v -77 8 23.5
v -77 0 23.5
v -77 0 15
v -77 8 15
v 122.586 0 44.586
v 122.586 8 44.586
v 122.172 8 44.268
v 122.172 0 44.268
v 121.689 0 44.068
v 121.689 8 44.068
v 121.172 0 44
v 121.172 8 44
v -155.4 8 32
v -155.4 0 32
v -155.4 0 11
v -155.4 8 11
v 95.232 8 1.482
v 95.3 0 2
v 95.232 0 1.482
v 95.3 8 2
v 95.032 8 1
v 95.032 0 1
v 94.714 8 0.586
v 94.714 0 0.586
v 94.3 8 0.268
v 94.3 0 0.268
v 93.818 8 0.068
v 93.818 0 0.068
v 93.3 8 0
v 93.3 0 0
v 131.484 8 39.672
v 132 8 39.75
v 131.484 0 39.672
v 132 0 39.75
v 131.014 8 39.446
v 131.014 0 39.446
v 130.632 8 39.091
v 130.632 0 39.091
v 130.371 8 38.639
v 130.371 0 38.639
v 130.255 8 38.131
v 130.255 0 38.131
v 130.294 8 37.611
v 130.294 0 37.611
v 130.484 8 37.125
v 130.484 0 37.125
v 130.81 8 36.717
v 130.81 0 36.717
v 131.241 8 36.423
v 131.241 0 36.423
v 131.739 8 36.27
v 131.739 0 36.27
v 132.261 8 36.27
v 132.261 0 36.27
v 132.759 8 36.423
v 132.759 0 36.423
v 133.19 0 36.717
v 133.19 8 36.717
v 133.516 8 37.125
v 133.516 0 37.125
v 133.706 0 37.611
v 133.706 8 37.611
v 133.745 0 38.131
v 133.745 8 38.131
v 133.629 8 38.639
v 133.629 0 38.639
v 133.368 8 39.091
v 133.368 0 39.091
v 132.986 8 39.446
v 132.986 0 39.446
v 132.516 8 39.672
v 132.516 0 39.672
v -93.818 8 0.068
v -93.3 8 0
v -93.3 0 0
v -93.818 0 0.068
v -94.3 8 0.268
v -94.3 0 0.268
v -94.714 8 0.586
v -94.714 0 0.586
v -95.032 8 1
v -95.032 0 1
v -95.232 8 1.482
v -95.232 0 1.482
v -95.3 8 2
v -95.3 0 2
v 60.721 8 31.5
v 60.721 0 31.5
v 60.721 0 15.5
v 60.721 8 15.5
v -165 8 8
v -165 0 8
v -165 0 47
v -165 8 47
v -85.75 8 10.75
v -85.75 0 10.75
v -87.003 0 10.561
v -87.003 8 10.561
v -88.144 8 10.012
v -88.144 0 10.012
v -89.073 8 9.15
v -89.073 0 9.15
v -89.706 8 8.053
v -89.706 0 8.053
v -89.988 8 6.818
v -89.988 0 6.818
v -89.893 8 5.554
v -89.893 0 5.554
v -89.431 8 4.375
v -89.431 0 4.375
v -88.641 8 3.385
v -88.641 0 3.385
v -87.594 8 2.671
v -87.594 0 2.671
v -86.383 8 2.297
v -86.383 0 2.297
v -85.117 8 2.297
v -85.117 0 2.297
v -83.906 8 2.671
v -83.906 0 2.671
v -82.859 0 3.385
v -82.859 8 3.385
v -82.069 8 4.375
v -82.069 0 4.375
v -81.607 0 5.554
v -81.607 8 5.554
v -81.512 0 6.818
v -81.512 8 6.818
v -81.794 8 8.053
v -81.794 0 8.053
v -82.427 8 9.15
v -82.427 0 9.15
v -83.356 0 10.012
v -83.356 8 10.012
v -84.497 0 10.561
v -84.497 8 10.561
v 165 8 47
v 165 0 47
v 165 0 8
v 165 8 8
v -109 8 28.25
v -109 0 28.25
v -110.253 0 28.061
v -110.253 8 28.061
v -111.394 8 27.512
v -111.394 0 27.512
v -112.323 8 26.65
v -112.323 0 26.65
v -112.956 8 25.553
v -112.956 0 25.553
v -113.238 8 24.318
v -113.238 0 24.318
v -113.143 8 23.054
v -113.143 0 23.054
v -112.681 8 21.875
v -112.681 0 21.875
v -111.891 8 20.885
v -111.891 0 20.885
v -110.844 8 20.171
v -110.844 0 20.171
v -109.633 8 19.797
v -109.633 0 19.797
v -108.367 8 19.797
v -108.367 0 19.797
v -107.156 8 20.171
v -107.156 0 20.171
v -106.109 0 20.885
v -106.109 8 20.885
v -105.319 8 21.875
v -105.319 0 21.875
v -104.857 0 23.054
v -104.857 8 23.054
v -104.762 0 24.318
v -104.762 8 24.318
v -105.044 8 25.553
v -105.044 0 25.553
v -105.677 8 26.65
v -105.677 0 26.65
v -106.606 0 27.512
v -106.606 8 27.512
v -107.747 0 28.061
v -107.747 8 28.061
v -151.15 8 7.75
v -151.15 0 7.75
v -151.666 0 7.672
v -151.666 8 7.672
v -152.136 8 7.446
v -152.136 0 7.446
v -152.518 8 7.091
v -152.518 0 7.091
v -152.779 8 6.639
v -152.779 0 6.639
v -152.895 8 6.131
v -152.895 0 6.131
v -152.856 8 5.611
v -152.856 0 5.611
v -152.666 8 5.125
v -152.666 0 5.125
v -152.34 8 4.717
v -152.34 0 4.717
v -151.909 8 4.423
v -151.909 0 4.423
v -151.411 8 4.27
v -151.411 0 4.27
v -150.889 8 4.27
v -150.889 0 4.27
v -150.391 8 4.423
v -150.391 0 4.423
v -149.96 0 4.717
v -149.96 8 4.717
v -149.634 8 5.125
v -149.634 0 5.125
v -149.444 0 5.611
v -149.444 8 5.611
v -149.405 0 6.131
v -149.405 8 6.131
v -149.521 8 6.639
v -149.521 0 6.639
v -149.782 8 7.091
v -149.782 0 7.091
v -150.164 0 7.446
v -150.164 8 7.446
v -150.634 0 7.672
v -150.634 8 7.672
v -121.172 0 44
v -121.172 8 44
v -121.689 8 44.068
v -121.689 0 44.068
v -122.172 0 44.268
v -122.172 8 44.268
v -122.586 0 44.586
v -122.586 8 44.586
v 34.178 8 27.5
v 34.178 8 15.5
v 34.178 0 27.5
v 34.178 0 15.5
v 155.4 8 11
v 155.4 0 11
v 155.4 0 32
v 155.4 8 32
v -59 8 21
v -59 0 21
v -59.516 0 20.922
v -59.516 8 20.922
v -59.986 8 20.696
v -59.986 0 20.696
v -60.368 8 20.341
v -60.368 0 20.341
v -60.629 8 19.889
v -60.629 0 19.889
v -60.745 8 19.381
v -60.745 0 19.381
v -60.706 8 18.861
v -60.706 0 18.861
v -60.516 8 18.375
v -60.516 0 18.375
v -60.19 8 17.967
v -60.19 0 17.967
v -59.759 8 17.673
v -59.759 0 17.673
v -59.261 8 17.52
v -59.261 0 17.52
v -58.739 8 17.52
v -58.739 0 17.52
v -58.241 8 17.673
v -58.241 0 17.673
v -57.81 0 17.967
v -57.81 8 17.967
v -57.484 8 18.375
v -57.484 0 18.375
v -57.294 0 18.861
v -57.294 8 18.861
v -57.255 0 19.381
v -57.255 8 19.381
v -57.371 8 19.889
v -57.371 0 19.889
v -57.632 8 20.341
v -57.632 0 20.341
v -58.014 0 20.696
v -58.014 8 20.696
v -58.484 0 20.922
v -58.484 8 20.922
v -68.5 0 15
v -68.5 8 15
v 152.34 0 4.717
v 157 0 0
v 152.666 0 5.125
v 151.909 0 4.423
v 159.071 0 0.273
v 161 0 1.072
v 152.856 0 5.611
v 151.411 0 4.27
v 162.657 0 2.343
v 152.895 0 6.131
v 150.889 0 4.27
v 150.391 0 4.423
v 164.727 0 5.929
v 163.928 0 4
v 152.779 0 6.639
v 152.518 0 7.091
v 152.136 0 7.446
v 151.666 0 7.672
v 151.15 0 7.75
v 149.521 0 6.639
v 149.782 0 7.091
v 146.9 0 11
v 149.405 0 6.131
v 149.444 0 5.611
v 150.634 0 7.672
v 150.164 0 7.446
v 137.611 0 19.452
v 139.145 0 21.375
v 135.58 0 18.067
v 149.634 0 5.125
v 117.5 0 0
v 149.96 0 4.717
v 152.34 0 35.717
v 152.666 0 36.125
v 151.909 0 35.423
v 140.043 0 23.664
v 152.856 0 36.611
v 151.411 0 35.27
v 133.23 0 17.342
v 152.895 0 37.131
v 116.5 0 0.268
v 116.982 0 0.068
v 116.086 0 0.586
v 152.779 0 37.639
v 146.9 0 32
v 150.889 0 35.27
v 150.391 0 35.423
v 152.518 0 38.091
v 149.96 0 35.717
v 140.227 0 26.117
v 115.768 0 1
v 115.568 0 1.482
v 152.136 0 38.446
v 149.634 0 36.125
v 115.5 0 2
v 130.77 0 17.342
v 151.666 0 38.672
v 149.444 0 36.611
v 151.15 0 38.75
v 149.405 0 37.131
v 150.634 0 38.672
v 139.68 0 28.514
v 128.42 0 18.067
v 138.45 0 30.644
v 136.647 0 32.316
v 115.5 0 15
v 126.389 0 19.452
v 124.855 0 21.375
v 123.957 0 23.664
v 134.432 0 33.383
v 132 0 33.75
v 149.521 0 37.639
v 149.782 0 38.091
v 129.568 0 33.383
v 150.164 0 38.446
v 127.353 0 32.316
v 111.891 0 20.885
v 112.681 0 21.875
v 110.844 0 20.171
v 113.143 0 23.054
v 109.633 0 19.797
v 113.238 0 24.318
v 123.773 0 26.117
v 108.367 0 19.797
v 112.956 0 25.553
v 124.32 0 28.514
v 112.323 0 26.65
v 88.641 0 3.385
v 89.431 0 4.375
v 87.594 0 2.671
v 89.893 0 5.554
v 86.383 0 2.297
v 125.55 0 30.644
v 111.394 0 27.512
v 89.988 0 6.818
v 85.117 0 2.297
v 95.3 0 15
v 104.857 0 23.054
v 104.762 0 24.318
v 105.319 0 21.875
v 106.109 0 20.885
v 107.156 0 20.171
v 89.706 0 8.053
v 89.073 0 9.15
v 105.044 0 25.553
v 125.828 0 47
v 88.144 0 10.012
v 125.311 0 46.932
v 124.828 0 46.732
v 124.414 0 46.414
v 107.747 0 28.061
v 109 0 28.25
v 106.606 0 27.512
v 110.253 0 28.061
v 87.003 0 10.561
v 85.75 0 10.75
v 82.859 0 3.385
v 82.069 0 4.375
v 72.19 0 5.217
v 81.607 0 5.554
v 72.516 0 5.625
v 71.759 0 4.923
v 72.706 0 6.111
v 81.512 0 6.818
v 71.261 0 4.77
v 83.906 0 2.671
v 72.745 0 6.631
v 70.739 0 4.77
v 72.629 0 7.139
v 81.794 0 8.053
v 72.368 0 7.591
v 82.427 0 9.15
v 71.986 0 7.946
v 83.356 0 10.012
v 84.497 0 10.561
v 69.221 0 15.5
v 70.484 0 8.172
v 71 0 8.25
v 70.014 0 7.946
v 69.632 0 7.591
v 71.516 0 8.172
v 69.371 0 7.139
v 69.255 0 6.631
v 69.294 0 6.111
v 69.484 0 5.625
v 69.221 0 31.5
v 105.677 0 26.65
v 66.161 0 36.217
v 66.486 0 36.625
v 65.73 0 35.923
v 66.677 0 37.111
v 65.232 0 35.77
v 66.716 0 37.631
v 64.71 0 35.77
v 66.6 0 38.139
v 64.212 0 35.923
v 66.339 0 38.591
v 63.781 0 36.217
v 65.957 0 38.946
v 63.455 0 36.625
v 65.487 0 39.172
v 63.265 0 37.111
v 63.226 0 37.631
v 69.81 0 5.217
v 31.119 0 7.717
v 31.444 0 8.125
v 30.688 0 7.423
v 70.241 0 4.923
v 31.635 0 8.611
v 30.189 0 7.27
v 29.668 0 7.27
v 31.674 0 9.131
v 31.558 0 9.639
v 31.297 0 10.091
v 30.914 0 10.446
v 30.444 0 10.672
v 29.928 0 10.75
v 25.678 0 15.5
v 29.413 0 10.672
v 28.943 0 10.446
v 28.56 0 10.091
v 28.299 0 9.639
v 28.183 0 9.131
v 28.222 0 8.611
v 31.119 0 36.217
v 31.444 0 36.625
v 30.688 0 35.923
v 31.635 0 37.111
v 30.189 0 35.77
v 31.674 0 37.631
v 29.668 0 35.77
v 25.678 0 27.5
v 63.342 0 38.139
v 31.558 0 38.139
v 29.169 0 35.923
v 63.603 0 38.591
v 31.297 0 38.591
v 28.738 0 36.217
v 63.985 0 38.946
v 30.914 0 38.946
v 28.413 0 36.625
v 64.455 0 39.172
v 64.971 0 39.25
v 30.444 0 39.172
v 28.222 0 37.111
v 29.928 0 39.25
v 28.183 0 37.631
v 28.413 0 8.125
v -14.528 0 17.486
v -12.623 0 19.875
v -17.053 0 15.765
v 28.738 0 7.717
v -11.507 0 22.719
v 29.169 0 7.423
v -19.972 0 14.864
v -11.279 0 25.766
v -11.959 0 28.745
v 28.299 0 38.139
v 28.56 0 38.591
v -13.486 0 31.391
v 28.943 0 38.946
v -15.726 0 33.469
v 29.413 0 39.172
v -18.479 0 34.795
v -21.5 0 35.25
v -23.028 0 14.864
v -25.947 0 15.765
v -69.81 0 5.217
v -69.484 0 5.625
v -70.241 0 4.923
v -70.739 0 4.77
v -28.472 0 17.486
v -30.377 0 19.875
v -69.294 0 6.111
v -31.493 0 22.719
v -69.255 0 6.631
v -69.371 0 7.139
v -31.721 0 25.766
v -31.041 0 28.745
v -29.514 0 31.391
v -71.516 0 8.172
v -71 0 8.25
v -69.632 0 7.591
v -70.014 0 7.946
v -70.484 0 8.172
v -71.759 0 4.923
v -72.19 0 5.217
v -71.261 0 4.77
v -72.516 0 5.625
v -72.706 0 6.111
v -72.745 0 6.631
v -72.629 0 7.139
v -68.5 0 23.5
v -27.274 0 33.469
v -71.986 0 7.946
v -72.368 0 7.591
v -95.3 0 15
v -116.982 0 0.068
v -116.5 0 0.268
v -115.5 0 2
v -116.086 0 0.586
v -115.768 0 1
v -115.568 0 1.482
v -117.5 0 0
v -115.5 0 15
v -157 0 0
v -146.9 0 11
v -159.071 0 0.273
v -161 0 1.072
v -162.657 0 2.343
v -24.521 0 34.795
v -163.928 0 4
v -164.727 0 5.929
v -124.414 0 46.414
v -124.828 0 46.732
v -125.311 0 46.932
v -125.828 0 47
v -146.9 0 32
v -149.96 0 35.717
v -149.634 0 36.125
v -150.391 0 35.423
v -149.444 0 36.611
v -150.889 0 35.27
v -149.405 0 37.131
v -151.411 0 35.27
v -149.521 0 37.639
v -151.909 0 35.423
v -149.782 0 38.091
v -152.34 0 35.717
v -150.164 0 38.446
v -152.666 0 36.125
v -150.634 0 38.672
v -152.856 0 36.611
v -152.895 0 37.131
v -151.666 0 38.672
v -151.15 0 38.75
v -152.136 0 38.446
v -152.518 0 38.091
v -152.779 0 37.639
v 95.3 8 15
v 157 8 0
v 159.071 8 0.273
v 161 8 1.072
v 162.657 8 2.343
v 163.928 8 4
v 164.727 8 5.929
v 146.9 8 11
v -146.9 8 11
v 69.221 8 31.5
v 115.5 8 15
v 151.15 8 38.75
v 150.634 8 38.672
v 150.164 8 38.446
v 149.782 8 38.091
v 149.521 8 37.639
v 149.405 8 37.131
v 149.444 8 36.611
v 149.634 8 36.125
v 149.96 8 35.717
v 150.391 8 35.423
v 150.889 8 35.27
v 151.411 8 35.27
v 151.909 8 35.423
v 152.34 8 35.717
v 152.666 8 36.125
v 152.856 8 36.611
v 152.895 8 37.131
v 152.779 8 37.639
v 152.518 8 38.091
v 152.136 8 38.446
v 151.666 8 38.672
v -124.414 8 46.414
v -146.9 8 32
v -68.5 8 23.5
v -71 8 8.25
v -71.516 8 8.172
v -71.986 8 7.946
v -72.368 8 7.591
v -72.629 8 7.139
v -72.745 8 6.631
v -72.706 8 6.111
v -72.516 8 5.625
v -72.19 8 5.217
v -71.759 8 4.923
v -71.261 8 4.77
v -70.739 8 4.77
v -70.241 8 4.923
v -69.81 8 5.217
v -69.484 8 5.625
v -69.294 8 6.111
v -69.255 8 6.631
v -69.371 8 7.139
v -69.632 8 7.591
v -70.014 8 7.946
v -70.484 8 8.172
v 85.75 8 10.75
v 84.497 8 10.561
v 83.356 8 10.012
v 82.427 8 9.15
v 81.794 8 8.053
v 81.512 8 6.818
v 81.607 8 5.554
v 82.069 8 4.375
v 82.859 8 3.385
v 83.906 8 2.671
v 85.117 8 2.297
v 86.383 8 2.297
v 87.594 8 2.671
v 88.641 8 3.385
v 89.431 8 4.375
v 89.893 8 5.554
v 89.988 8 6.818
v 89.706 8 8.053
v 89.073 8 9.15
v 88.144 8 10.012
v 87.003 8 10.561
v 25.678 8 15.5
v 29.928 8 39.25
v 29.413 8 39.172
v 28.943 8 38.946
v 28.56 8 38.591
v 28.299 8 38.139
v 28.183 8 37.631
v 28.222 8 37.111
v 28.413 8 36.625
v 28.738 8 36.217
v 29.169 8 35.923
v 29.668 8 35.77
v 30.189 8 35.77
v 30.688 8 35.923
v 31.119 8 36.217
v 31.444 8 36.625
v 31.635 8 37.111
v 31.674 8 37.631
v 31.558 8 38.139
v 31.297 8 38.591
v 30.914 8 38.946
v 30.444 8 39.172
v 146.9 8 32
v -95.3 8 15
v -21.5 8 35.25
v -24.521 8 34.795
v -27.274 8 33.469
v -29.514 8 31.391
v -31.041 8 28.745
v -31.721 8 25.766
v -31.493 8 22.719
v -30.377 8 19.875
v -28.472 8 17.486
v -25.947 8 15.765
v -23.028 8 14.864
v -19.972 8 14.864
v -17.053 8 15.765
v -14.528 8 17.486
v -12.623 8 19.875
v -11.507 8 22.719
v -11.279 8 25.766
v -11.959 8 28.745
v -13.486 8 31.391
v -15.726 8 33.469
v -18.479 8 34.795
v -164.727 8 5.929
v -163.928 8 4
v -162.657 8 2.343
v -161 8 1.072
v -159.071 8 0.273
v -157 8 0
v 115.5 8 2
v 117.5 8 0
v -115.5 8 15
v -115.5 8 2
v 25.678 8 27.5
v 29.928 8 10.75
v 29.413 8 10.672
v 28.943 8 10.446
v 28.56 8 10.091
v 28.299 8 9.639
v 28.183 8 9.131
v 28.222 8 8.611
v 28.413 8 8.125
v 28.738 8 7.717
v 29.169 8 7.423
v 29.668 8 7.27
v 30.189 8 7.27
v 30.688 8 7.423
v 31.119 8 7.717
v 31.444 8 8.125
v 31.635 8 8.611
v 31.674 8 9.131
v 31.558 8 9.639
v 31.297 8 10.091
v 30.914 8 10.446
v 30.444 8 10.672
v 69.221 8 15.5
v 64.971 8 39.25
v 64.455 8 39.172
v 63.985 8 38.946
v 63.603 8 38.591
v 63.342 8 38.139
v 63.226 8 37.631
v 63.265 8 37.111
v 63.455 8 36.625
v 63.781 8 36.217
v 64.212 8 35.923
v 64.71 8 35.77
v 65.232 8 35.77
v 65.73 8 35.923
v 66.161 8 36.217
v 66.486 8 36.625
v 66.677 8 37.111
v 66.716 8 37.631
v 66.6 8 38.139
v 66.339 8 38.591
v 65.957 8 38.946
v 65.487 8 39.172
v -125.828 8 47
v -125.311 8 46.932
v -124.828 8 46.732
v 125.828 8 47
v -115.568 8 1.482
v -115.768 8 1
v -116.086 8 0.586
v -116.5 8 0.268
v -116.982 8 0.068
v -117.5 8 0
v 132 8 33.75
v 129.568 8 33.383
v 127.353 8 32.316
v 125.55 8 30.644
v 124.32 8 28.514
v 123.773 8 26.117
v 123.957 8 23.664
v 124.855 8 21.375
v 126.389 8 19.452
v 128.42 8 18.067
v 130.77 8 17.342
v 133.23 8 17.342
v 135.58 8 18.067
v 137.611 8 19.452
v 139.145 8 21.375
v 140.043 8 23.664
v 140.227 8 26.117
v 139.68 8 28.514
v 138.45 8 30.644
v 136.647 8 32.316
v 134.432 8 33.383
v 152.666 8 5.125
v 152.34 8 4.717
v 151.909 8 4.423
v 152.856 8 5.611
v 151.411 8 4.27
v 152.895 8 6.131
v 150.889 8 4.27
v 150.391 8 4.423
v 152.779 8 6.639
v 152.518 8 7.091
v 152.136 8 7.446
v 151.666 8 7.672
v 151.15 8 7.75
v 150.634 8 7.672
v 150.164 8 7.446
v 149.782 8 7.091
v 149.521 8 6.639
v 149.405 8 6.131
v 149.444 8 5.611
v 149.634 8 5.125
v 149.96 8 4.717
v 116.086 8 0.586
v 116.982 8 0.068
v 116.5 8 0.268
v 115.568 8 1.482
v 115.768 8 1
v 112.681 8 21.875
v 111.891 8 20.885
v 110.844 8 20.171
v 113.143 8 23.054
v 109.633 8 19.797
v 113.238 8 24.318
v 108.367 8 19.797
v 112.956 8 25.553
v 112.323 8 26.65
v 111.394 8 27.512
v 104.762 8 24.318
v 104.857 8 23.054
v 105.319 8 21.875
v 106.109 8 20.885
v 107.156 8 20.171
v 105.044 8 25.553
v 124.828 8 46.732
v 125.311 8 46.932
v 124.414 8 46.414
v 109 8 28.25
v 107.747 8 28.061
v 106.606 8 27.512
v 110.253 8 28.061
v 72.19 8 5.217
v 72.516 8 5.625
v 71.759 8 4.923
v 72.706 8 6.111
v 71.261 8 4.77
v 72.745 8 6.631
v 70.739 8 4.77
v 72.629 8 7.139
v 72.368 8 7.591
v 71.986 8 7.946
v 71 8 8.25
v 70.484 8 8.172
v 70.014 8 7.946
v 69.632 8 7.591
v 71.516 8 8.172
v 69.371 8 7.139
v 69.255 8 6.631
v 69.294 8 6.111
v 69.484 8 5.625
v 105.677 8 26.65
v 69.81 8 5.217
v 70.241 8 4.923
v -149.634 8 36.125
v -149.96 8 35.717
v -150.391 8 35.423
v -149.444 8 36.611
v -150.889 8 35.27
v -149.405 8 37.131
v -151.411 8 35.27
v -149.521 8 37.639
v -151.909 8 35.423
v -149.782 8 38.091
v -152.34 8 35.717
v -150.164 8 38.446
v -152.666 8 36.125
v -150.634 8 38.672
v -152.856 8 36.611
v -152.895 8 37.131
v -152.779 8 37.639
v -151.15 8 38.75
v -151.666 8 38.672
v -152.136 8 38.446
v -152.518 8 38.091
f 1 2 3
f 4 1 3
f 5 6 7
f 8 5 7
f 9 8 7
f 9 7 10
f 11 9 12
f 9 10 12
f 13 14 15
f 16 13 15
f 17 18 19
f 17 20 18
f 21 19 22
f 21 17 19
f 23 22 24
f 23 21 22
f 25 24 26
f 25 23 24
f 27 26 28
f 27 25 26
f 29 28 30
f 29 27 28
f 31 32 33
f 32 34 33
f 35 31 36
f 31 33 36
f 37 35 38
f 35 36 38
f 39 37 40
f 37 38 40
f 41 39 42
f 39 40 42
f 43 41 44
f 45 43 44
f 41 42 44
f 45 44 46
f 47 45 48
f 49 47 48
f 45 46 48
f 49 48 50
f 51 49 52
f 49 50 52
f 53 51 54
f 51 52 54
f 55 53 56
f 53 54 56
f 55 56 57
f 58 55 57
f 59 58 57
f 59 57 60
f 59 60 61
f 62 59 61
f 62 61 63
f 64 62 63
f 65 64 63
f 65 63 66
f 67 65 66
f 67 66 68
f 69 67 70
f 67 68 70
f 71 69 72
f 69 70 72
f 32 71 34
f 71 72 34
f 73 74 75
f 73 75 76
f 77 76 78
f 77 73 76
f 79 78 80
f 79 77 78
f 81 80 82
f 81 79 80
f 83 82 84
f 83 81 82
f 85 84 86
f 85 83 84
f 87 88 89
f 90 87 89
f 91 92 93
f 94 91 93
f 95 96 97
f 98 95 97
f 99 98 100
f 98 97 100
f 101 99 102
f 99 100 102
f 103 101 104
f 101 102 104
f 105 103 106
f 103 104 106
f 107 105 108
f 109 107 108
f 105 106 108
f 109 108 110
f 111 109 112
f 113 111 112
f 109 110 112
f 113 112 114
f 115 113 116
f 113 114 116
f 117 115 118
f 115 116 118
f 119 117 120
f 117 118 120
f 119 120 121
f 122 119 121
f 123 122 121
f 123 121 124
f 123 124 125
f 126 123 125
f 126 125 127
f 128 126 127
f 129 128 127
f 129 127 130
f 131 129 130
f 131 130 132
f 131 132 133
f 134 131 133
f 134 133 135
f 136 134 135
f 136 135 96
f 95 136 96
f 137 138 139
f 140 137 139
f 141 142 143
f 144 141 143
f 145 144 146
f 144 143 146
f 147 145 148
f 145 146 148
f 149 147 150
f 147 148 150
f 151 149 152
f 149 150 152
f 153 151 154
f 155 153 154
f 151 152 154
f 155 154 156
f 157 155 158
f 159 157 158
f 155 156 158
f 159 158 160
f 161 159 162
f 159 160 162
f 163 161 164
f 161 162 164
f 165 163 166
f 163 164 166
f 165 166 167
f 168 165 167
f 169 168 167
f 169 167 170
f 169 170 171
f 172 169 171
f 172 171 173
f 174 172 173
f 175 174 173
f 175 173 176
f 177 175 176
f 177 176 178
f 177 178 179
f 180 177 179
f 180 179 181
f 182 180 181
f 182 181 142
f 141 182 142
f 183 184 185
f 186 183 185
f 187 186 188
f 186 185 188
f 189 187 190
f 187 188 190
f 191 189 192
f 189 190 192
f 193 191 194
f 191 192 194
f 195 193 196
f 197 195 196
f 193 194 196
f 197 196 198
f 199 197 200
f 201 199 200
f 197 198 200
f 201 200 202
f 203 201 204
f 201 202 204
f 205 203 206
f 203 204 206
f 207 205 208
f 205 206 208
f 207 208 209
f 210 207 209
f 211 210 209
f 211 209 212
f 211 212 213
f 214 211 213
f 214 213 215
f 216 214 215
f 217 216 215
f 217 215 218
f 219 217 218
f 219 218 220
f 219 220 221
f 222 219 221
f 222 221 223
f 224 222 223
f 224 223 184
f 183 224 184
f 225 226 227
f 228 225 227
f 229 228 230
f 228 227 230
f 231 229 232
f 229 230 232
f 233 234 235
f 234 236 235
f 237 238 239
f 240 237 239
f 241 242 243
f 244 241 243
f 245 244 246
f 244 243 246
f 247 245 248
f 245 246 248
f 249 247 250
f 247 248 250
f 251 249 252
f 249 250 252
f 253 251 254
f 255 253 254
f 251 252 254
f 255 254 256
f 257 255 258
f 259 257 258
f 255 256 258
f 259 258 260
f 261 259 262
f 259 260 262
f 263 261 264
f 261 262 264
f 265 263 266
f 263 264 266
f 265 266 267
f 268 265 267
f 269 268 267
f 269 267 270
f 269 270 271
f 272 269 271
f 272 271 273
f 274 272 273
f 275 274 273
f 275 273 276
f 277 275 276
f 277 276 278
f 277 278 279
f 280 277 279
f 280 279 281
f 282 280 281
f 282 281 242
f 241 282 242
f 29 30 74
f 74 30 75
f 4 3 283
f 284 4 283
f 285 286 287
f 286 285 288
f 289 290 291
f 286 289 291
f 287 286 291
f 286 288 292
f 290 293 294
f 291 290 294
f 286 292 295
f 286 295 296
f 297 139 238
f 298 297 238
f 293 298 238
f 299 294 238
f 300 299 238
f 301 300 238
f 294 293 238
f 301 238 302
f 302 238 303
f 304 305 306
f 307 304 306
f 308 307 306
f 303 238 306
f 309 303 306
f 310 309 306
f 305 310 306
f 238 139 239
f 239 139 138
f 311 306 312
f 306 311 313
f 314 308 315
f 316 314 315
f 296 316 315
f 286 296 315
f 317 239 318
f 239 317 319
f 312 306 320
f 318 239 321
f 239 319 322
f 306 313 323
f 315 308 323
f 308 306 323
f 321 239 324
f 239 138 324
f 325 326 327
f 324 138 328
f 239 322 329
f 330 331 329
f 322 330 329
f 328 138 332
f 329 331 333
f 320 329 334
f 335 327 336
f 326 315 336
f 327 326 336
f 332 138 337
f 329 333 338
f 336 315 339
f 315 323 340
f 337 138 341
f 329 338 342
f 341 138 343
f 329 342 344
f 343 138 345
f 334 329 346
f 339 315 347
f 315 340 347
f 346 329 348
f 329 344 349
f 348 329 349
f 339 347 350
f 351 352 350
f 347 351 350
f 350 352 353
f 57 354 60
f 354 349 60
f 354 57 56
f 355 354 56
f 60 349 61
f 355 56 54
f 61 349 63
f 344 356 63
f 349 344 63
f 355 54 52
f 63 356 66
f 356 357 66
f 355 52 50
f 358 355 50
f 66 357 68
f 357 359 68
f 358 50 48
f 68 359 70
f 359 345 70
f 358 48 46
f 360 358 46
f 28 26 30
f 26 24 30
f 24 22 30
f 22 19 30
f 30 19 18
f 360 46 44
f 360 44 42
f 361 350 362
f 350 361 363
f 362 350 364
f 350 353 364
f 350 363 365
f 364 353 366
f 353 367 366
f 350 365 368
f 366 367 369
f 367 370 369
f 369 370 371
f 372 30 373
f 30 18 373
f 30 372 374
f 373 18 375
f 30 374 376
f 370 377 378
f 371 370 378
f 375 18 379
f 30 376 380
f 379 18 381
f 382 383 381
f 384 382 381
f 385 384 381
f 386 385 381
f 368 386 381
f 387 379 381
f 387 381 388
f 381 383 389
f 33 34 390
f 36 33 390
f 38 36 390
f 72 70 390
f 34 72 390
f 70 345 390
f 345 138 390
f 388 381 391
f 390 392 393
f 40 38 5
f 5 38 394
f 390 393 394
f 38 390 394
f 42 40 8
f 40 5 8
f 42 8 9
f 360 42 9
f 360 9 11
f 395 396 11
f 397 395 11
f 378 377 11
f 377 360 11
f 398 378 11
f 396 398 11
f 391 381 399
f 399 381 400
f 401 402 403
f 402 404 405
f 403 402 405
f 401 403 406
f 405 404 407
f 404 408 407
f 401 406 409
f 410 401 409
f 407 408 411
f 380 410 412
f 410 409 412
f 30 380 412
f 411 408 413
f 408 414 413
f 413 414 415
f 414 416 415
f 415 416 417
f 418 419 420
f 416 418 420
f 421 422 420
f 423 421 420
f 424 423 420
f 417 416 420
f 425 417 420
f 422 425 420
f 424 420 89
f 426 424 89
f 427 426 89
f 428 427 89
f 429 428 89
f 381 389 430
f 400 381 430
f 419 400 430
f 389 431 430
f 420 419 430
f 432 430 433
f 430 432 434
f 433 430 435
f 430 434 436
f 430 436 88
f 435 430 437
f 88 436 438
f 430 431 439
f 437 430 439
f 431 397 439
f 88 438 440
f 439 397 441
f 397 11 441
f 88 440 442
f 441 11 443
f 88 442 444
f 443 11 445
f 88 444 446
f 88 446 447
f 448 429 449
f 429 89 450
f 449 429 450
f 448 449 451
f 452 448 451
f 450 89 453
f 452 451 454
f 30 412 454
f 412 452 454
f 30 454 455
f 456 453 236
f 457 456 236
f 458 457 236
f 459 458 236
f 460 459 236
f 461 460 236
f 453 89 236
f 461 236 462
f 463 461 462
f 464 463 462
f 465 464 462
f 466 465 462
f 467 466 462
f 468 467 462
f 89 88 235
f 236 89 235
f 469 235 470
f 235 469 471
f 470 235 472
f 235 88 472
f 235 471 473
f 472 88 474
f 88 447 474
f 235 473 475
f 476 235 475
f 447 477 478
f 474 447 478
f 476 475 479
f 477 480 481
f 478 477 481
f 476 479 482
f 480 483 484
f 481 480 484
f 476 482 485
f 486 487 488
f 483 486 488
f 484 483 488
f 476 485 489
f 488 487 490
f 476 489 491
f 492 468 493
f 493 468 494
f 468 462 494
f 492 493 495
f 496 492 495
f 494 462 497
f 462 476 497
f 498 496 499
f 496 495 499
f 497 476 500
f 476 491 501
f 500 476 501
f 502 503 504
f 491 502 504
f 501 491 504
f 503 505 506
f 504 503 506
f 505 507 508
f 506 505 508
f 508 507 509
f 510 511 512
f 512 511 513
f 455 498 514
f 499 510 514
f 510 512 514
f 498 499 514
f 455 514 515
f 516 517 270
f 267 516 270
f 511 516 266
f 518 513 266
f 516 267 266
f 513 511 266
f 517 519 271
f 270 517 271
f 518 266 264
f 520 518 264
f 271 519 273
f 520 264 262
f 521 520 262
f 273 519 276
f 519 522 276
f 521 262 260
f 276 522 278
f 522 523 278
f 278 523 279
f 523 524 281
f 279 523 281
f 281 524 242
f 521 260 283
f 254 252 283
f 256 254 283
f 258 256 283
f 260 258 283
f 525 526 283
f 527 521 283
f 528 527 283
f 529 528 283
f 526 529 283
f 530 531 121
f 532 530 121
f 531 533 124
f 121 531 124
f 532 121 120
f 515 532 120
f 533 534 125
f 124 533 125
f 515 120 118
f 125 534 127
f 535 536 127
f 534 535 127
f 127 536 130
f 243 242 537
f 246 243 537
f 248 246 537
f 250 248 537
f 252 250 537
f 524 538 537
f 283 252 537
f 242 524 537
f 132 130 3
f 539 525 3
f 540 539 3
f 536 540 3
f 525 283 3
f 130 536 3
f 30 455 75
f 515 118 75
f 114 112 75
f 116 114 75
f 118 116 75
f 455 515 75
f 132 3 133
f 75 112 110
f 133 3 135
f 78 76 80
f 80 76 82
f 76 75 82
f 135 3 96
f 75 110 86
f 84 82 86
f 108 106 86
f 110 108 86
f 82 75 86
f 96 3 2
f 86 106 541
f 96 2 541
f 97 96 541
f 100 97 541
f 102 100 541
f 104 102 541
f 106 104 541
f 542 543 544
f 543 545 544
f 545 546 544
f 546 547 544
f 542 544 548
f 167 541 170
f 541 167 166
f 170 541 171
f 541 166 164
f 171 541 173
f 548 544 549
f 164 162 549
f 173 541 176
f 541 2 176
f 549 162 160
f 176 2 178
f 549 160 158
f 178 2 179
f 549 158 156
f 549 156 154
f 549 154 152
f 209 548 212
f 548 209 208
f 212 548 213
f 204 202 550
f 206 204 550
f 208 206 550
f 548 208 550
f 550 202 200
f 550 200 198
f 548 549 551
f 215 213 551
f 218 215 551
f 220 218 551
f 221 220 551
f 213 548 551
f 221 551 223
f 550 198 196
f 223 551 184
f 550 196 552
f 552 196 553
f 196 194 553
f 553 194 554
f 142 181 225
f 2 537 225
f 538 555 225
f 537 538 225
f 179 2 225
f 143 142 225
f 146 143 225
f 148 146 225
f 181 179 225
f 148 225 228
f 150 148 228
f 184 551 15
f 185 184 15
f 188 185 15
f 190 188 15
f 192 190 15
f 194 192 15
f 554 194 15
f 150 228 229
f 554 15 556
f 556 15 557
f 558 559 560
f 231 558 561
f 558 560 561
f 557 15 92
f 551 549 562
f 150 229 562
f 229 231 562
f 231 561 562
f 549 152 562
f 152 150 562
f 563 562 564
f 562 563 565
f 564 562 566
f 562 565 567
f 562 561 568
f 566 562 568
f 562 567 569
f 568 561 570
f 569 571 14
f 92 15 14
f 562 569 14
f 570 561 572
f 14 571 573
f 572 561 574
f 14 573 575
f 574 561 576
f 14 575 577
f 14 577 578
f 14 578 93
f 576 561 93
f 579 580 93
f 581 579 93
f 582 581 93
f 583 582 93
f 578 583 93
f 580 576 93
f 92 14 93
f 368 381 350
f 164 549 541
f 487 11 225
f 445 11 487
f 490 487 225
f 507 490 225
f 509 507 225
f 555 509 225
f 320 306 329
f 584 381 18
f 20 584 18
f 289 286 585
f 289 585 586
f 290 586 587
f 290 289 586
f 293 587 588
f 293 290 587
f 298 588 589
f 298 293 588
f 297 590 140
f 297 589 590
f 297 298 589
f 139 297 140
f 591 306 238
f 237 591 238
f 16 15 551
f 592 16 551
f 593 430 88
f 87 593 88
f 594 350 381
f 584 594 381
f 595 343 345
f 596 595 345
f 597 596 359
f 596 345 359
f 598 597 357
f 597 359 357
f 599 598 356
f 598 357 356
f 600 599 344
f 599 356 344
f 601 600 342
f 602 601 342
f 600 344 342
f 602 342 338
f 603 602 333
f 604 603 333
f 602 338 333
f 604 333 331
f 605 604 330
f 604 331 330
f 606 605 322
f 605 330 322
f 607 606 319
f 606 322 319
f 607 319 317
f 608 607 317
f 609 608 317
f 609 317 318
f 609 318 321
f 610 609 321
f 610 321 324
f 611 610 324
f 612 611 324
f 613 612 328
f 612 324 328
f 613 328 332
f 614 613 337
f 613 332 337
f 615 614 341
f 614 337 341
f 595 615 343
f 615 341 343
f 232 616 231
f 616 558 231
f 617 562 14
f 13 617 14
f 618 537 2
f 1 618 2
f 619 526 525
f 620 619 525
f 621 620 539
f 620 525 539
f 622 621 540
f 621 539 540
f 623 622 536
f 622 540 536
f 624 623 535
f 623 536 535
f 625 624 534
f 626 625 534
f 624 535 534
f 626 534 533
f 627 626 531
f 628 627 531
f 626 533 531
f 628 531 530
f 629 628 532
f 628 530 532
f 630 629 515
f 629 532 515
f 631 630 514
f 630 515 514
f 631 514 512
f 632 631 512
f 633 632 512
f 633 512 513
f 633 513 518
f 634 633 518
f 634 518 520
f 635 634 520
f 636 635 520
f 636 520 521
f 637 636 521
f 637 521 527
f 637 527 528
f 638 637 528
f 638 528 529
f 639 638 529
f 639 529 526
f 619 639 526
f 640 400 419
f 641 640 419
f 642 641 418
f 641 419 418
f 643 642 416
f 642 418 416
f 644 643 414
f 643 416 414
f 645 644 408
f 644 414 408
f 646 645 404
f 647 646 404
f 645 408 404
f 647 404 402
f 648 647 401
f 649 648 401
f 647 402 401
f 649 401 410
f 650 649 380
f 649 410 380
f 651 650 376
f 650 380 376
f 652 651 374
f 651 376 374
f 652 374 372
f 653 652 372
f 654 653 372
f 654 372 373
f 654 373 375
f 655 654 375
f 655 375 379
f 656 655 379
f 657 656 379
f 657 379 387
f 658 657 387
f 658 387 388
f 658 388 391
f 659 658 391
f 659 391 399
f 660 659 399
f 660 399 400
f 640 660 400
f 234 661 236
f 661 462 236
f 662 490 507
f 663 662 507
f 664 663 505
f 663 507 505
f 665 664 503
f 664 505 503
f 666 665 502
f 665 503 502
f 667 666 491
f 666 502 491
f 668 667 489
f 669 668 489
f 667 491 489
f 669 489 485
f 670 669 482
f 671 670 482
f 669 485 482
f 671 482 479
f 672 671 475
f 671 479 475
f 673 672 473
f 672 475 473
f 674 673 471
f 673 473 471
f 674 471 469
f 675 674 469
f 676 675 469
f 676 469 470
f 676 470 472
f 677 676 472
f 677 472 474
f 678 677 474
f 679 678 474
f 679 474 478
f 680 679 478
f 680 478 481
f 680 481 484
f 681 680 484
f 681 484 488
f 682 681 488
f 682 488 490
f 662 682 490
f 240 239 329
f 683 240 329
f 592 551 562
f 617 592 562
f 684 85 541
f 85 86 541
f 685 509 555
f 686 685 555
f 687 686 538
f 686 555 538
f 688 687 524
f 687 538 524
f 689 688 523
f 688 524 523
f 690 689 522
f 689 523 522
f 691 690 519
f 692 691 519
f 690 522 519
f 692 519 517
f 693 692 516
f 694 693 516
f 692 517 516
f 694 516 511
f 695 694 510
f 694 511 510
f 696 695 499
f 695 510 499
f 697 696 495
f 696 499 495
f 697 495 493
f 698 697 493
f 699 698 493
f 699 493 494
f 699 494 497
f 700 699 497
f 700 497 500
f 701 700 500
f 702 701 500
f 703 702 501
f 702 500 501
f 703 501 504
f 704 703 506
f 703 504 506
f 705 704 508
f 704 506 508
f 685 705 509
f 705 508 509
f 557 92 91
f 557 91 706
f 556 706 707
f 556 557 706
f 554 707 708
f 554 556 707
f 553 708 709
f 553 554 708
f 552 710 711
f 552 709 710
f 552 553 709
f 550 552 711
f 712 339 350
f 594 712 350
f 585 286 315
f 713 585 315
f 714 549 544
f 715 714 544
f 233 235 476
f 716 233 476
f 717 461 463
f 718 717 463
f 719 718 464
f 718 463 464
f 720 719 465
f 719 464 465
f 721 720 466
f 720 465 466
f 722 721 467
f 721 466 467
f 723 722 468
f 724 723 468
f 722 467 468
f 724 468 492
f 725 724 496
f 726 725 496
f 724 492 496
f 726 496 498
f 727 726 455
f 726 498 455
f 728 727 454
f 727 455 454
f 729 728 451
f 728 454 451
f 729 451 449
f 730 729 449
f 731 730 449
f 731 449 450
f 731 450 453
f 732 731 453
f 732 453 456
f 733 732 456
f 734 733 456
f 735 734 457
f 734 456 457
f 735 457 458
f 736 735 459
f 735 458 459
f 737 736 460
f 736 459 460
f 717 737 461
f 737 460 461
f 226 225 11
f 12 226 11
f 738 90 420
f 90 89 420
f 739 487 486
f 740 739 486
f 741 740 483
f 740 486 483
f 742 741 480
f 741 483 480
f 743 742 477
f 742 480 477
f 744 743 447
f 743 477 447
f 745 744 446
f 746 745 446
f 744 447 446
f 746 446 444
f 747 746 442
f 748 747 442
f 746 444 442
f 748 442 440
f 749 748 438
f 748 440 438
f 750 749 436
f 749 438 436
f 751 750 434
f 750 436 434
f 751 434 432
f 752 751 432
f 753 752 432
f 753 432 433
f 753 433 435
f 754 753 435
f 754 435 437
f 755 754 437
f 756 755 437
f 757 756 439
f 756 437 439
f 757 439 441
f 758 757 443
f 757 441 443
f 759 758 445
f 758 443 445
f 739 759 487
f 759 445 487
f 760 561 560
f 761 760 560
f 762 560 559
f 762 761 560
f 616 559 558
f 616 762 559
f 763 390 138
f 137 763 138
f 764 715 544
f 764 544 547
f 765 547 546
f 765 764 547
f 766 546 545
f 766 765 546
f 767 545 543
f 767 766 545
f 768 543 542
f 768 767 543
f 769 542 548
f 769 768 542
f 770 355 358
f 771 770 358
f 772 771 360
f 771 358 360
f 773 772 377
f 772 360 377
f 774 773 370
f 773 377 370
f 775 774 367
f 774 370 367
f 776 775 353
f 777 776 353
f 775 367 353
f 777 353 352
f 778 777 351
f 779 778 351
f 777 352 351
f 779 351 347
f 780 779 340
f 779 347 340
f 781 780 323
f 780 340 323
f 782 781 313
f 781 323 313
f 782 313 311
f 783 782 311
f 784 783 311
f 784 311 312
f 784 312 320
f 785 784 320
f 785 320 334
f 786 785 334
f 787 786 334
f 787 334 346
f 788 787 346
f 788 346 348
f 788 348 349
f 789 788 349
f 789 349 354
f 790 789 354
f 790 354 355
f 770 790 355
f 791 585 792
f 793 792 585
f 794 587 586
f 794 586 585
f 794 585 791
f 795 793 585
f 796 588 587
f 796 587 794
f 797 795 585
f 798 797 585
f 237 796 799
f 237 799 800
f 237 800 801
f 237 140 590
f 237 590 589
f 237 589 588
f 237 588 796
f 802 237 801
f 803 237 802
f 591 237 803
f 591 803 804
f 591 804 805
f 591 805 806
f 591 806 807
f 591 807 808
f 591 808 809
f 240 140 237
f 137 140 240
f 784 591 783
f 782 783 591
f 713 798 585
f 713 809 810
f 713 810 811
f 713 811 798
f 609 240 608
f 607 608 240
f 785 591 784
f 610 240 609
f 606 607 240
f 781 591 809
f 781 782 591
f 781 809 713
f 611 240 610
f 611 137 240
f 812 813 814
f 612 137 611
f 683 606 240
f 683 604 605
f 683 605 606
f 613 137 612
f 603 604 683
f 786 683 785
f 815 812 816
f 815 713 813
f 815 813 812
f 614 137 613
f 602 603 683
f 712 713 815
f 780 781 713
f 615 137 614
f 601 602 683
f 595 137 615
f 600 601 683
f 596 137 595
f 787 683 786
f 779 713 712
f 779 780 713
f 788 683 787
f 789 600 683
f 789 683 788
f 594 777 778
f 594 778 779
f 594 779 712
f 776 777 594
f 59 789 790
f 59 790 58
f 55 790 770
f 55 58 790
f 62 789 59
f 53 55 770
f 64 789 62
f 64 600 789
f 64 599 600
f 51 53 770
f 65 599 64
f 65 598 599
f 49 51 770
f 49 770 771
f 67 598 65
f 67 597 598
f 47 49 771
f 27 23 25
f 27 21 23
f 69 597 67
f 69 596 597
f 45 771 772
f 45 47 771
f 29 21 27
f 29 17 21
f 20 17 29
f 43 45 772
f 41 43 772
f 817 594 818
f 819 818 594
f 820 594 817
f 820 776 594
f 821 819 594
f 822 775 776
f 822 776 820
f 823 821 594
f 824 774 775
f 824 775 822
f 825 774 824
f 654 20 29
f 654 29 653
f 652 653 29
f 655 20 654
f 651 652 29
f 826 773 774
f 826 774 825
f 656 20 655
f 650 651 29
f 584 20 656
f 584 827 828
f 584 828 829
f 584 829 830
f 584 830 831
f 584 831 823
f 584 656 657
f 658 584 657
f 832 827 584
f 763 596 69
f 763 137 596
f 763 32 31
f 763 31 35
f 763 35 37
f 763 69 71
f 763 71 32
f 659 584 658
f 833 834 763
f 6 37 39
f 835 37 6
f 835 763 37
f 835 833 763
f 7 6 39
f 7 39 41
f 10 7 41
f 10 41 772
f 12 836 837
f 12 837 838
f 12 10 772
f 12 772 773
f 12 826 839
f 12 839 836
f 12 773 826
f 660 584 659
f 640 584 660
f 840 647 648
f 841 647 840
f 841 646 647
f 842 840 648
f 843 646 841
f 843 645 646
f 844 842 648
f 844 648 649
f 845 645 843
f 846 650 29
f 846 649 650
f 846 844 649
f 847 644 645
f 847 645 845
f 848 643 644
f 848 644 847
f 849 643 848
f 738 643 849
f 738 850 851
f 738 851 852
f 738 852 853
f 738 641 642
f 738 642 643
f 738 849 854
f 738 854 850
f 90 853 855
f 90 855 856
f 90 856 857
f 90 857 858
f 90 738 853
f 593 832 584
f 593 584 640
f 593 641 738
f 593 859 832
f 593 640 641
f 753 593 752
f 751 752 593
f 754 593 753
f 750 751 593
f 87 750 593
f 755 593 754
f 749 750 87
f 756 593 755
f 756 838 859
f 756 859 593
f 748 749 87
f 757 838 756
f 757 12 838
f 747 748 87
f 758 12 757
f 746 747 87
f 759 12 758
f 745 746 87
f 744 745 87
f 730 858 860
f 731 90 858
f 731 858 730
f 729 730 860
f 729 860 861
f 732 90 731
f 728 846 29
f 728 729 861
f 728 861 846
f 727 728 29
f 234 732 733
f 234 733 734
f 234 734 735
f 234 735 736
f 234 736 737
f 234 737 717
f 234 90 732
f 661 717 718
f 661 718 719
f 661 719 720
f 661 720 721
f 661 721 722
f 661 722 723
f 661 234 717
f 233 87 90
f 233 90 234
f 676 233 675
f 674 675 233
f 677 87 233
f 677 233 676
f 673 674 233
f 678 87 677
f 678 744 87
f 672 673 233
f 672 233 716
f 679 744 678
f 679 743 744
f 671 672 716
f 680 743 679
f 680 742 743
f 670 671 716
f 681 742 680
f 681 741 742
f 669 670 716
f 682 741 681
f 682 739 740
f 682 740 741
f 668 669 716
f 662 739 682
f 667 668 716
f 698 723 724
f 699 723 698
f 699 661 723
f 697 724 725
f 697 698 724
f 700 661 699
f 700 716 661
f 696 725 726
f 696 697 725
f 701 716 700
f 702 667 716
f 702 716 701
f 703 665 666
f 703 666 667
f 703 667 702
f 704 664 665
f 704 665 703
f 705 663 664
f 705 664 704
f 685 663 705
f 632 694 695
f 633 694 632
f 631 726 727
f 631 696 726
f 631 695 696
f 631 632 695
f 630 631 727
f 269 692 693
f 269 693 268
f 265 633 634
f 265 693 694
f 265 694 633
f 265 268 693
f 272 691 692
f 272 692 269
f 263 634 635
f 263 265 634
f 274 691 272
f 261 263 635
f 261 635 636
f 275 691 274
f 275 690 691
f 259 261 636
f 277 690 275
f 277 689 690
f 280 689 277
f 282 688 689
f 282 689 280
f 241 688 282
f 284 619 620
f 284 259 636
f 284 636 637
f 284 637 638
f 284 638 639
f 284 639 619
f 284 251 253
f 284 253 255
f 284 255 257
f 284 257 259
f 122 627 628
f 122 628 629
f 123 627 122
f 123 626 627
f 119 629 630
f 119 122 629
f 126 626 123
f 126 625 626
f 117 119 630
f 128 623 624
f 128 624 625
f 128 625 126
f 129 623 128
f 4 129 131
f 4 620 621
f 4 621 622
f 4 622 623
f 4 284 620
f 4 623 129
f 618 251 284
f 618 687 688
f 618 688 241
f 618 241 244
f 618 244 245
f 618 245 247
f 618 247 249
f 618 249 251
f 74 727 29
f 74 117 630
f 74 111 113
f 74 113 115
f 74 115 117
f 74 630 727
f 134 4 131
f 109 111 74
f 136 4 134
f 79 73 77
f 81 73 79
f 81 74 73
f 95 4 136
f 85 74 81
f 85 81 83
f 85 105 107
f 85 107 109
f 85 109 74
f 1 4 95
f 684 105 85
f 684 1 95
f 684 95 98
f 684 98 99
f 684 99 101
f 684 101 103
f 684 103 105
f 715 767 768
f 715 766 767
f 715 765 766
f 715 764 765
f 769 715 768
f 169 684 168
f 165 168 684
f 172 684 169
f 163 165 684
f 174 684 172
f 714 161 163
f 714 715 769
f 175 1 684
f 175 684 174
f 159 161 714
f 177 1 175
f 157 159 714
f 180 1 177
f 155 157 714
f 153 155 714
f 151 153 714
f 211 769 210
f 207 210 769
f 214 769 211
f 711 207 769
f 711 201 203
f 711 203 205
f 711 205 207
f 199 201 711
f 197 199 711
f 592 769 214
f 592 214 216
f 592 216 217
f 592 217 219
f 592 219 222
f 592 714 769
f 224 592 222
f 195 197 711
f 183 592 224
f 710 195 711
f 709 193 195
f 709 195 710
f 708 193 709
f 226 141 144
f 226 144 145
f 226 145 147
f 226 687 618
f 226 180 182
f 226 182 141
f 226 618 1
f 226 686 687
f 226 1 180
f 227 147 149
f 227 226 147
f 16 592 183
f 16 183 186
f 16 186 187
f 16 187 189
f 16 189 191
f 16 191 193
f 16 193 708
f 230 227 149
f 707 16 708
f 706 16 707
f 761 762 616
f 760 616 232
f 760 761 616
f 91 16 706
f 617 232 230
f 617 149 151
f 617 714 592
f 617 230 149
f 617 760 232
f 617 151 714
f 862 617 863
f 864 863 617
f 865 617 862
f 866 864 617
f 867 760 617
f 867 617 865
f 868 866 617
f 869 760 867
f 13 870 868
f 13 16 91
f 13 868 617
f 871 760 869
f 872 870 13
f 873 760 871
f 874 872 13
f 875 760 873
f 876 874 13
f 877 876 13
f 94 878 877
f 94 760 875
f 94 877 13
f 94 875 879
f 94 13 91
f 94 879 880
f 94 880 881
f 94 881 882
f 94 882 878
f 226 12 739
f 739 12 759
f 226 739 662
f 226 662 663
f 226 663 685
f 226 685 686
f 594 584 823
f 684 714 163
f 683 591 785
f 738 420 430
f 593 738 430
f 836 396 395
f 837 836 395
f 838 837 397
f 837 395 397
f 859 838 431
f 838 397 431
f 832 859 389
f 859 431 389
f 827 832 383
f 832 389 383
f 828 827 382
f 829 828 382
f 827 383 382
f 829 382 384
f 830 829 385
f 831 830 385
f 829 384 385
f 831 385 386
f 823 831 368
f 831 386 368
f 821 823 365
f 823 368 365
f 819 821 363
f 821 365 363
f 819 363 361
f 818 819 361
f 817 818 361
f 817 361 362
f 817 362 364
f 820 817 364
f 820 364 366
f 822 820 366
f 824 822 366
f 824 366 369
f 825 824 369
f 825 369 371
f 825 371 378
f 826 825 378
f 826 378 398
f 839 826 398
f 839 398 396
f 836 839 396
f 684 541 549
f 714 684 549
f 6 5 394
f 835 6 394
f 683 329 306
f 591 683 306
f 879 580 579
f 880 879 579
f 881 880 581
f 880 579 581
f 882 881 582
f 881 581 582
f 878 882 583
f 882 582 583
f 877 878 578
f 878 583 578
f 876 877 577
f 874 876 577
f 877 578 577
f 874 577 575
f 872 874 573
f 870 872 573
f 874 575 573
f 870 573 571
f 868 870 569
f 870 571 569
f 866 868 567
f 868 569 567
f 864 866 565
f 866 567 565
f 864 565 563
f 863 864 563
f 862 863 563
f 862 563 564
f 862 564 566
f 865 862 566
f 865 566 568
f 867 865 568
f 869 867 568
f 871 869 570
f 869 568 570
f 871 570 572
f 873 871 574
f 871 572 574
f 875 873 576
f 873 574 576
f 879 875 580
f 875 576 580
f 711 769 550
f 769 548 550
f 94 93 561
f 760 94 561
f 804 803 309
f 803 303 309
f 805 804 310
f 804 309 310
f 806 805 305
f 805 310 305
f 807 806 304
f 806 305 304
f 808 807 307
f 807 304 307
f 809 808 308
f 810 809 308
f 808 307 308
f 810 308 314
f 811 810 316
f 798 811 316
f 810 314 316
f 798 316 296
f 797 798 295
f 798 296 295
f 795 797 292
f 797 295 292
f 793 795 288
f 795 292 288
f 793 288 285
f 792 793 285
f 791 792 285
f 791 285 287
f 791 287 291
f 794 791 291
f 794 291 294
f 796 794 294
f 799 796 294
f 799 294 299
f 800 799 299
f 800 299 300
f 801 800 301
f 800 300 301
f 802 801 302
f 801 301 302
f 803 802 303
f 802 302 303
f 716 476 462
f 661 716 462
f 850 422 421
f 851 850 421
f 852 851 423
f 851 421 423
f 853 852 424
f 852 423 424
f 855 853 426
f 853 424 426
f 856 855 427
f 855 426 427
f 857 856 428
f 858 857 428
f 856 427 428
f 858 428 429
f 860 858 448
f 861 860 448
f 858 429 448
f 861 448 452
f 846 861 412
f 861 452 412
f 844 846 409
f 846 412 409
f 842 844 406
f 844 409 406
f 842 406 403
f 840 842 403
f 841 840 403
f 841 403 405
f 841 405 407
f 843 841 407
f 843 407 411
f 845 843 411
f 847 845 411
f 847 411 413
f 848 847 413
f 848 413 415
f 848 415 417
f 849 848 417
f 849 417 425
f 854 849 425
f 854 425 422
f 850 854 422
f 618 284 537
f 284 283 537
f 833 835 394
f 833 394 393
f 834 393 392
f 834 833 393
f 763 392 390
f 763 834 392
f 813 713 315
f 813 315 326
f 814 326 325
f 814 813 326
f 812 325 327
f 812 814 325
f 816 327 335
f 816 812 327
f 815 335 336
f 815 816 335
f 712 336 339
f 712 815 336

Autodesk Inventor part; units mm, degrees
sketch "Sketch1" plane through (0, 0, 0) normal (0, 1, 0) x (-1, 0, 0)
  line L0 (-165, 47) -> (-165, 8)
  line L1 (165, 8) -> (165, 47)
  line L2 (-78, 0) -> (95.3, 0)
  line L3 (95.3, 0) -> (95.3, 15)
  line L4 (95.3, 15) -> (115.5, 15)
  line L5 (115.5, 15) -> (115.5, 0)
  line L6 (-115.5, 0) -> (-115.5, 15)
  line L7 (-115.5, 15) -> (-95.3, 15)
  line L8 (-95.3, 15) -> (-95.3, 0)
  line L9 (125, 47) -> (122, 44)
  line L10 (122, 44) -> (-122, 44)
  line L11 (-122, 44) -> (-125, 47)
  line L12 (0, 0) -> (0, 44) construction
  line L13 (165, 47) -> (125, 47)
  line L14 (-125, 47) -> (-165, 47)
  line L15 (115.5, 0) -> (157, 0)
  line L16 (-157, 0) -> (-115.5, 0)
  line L17 (-95.3, 0) -> (95.3, 0)
  line L18 (155.4, 11) -> (146.9, 11)
  line L19 (146.9, 11) -> (146.9, 32)
  line L20 (146.9, 32) -> (155.4, 32)
  line L21 (155.4, 32) -> (155.4, 11)
  line L22 (-146.9, 11) -> (-155.4, 11)
  line L23 (-155.4, 11) -> (-155.4, 32)
  line L24 (-155.4, 32) -> (-146.9, 32)
  line L25 (-146.9, 32) -> (-146.9, 11)
  line L26 (77, 15) -> (68.5, 15)
  line L27 (68.5, 15) -> (68.5, 23.5)
  line L28 (68.5, 23.5) -> (77, 23.5)
  line L29 (77, 23.5) -> (77, 15)
  line L30 (-25.6785, 15.5) -> (-34.1785, 15.5)
  line L31 (-34.1785, 15.5) -> (-34.1785, 27.5)
  line L32 (-34.1785, 27.5) -> (-25.6785, 27.5)
  line L33 (-25.6785, 27.5) -> (-25.6785, 15.5)
  line L34 (-60.7209, 15.5) -> (-69.2209, 15.5)
  line L35 (-69.2209, 15.5) -> (-69.2209, 31.5)
  line L36 (-69.2209, 31.5) -> (-60.7209, 31.5)
  line L37 (-60.7209, 31.5) -> (-60.7209, 15.5)
  arc A0 (157, 0) -> (165, 8) centre (157, 8) ccw
  arc A1 (-165, 8) -> (-157, 0) centre (-157, 8) ccw
  dimension "d0" = 330
  dimension "d1" = 47
  dimension "d2" = 45
  dimension "d3" = 3
  dimension "d4" = 40
  dimension "d5" = 49.5
  dimension "d6" = 20.2
  dimension "d8" = 15
  dimension "d9" = 11
  dimension "d10" = 9.6
  dimension "d11" = 8.5
  dimension "d12" = 21
  dimension "d13" = 8.5
  dimension "d14" = 8.5
  dimension "d15" = 8.5
  dimension "d16" = 12
  dimension "d17" = 8.5
  dimension "d18" = 16
  dimension "d19" = 95.7791
  dimension "d20" = 130.8215
  dimension "d21" = 88
  dimension "d22" = 15
  dimension "d23" = 15.5
  dimension "d24" = 15.5
  dimension "d25" = 8
extrude "Extrusion1" add sketch "Sketch1" along normal blind 8
fillet "Fillet1" radius 2 8 edges at (-115.5, 4, 0) (-95.3, 4, 0) (95.3, 4, 0) (115.5, 4, 0) (-125, 4, 47) (-122, 4, 44) (122, 4, 44) (125, 4, 47)
sketch "Sketch2" plane through (0, 8, 0) normal (0, 1, 0) x (1, 0, 0)
  arc A0 (124.4142, -46.4142) -> (125.8284, -47) centre (125.8284, -45) ccw construction
  line L0 (125.8284, -47) -> (165, -47) construction
  line L1 (165, -47) -> (165, -8) construction
  arc A1 (165, -8) -> (157, 0) centre (157, -8) ccw construction
  line L2 (157, 0) -> (117.5, 0) construction
  arc A2 (117.5, 0) -> (115.5, -2) centre (117.5, -2) ccw construction
  line L3 (115.5, -2) -> (115.5, -15) construction
  line L4 (115.5, -15) -> (95.3, -15) construction
  line L5 (95.3, -15) -> (95.3, -2) construction
  arc A3 (95.3, -2) -> (93.3, 0) centre (93.3, -2) ccw construction
  line L6 (93.3, 0) -> (-93.3, 0) construction
  arc A4 (-93.3, 0) -> (-95.3, -2) centre (-93.3, -2) ccw construction
  line L7 (-95.3, -2) -> (-95.3, -15) construction
  line L8 (-95.3, -15) -> (-115.5, -15) construction
  line L9 (-115.5, -15) -> (-115.5, -2) construction
  arc A5 (-115.5, -2) -> (-117.5, 0) centre (-117.5, -2) ccw construction
  line L10 (-117.5, 0) -> (-157, 0) construction
  arc A6 (-157, 0) -> (-165, -8) centre (-157, -8) ccw construction
  line L11 (-165, -8) -> (-165, -47) construction
  line L12 (-165, -47) -> (-125.8284, -47) construction
  arc A7 (-125.8284, -47) -> (-124.4142, -46.4142) centre (-125.8284, -45) ccw construction
  line L13 (-124.4142, -46.4142) -> (-122.5858, -44.5858) construction
  arc A8 (-121.1716, -44) -> (-122.5858, -44.5858) centre (-121.1716, -46) ccw construction
  line L14 (-121.1716, -44) -> (121.1716, -44) construction
  arc A9 (122.5858, -44.5858) -> (121.1716, -44) centre (121.1716, -46) ccw construction
  line L15 (122.5858, -44.5858) -> (124.4142, -46.4142) construction
  line L16 (155.4, -11) -> (155.4, -32) construction
  line L17 (155.4, -32) -> (146.9, -32) construction
  line L18 (146.9, -32) -> (146.9, -11) construction
  line L19 (146.9, -11) -> (155.4, -11) construction
  line L20 (-146.9, -11) -> (-146.9, -32) construction
  line L21 (-146.9, -32) -> (-155.4, -32) construction
  line L22 (-155.4, -32) -> (-155.4, -11) construction
  line L23 (-155.4, -11) -> (-146.9, -11) construction
  line L24 (69.2209, -15.5) -> (69.2209, -31.5) construction
  line L25 (69.2209, -31.5) -> (60.7209, -31.5) construction
  line L26 (60.7209, -31.5) -> (60.7209, -15.5) construction
  line L27 (60.7209, -15.5) -> (69.2209, -15.5) construction
  line L28 (34.1785, -15.5) -> (34.1785, -27.5) construction
  line L29 (34.1785, -27.5) -> (25.6785, -27.5) construction
  line L30 (25.6785, -27.5) -> (25.6785, -15.5) construction
  line L31 (25.6785, -15.5) -> (34.1785, -15.5) construction
  line L32 (-68.5, -15) -> (-68.5, -23.5) construction
  line L33 (-68.5, -23.5) -> (-77, -23.5) construction
  line L34 (-77, -23.5) -> (-77, -15) construction
  line L35 (-77, -15) -> (-68.5, -15) construction
  line L36 (-165, -47) -> (-125.8284, -47) construction
  line L37 (-151.15, -47) -> (-151.15, 0) construction
  line L38 (151.15, 0) -> (151.15, -47) construction
  line L39 (29.9285, -9) -> (29.9285, -37.5) construction
  line L40 (64.9709, -15.5) -> (64.9709, -37.5) construction
  line L41 (-77, -23.5) -> (-77, -15) construction
  line L42 (-77, -19.25) -> (-59, -19.25) construction
  point P0 (0, 0)
  point P1 (-151.15, -11)
  point P2 (151.15, -11)
  point P3 (151.15, -6)
  point P4 (151.15, -37)
  point P5 (-151.15, -6)
  point P6 (-151.15, -37)
  point P7 (71, -6.5)
  point P8 (85.75, -6.5)
  point P9 (109, -24)
  point P10 (132, -38)
  point P11 (132, -25.5)
  point P12 (-85.75, -6.5)
  point P13 (-71, -6.5)
  point P14 (-109, -24)
  point P15 (29.9285, -27.5)
  point P16 (29.9285, -15.5)
  point P17 (-21.5, -25)
  dimension "d29" = 5
  dimension "d30" = 5
  dimension "d31" = 5
  dimension "d32" = 5
  dimension "d33" = 6.5
  dimension "d34" = 10
  dimension "d35" = 6
  dimension "d36" = 6.5
  dimension "d37" = 33
  dimension "d38" = 9
  dimension "d39" = 21.5
  dimension "d40" = 79.25
  dimension "d41" = 94
  dimension "d42" = 94
  dimension "d43" = 79.25
  dimension "d44" = 9.5
  dimension "d45" = 56
  dimension "d46" = 56
  dimension "d47" = 24
  dimension "d48" = 24
  dimension "d56" = 143.5
  dimension "d57" = 25
hole "Hole1" at (151.15, 8, 6) at (151.15, 8, 37) at (-151.15, 8, 6) at (-151.15, 8, 37) at (29.9285, 8, 9) at (29.9285, 8, 37.5) at (64.9709, 8, 37.5) at (71, 8, 6.5) at (132, 8, 38) at (-71, 8, 6.5) at (-59, 8, 19.25) direction (0, -1, 0) diameter 3.5 end through all
hole "Hole2" at (85.75, 8, 6.5) at (109, 8, 24) at (-85.75, 8, 6.5) at (-109, 8, 24) direction (0, -1, 0) diameter 8.5 end through all
hole "Hole3" at (-21.5, 8, 25) direction (0, -1, 0) diameter 20.5 end through all
hole "Hole4" at (132, 8, 25.5) direction (0, -1, 0) diameter 16.5 end through all
ref_plane "Work Plane1" through (-165, 8, 47) normal (0, 0, 1) x (1, 0, 0)
ref_plane "Work Plane2" through (29.9285, 8, 9) normal (-1, 0, 0) x (0, 0, 1)
ref_plane "Work Plane3" through (64.9709, 8, 15.5) normal (-1, 0, 0) x (0, 0, 1)
equation "\"d30\" = d29"
equation "\"d31\" = d29"
equation "\"d32\" = d31"
equation "\"d42\" = d41"
equation "\"d43\" = d40"
equation "\"d46\" = d45"
equation "\"d48\" = d47"
properties part number "A8-0009"
